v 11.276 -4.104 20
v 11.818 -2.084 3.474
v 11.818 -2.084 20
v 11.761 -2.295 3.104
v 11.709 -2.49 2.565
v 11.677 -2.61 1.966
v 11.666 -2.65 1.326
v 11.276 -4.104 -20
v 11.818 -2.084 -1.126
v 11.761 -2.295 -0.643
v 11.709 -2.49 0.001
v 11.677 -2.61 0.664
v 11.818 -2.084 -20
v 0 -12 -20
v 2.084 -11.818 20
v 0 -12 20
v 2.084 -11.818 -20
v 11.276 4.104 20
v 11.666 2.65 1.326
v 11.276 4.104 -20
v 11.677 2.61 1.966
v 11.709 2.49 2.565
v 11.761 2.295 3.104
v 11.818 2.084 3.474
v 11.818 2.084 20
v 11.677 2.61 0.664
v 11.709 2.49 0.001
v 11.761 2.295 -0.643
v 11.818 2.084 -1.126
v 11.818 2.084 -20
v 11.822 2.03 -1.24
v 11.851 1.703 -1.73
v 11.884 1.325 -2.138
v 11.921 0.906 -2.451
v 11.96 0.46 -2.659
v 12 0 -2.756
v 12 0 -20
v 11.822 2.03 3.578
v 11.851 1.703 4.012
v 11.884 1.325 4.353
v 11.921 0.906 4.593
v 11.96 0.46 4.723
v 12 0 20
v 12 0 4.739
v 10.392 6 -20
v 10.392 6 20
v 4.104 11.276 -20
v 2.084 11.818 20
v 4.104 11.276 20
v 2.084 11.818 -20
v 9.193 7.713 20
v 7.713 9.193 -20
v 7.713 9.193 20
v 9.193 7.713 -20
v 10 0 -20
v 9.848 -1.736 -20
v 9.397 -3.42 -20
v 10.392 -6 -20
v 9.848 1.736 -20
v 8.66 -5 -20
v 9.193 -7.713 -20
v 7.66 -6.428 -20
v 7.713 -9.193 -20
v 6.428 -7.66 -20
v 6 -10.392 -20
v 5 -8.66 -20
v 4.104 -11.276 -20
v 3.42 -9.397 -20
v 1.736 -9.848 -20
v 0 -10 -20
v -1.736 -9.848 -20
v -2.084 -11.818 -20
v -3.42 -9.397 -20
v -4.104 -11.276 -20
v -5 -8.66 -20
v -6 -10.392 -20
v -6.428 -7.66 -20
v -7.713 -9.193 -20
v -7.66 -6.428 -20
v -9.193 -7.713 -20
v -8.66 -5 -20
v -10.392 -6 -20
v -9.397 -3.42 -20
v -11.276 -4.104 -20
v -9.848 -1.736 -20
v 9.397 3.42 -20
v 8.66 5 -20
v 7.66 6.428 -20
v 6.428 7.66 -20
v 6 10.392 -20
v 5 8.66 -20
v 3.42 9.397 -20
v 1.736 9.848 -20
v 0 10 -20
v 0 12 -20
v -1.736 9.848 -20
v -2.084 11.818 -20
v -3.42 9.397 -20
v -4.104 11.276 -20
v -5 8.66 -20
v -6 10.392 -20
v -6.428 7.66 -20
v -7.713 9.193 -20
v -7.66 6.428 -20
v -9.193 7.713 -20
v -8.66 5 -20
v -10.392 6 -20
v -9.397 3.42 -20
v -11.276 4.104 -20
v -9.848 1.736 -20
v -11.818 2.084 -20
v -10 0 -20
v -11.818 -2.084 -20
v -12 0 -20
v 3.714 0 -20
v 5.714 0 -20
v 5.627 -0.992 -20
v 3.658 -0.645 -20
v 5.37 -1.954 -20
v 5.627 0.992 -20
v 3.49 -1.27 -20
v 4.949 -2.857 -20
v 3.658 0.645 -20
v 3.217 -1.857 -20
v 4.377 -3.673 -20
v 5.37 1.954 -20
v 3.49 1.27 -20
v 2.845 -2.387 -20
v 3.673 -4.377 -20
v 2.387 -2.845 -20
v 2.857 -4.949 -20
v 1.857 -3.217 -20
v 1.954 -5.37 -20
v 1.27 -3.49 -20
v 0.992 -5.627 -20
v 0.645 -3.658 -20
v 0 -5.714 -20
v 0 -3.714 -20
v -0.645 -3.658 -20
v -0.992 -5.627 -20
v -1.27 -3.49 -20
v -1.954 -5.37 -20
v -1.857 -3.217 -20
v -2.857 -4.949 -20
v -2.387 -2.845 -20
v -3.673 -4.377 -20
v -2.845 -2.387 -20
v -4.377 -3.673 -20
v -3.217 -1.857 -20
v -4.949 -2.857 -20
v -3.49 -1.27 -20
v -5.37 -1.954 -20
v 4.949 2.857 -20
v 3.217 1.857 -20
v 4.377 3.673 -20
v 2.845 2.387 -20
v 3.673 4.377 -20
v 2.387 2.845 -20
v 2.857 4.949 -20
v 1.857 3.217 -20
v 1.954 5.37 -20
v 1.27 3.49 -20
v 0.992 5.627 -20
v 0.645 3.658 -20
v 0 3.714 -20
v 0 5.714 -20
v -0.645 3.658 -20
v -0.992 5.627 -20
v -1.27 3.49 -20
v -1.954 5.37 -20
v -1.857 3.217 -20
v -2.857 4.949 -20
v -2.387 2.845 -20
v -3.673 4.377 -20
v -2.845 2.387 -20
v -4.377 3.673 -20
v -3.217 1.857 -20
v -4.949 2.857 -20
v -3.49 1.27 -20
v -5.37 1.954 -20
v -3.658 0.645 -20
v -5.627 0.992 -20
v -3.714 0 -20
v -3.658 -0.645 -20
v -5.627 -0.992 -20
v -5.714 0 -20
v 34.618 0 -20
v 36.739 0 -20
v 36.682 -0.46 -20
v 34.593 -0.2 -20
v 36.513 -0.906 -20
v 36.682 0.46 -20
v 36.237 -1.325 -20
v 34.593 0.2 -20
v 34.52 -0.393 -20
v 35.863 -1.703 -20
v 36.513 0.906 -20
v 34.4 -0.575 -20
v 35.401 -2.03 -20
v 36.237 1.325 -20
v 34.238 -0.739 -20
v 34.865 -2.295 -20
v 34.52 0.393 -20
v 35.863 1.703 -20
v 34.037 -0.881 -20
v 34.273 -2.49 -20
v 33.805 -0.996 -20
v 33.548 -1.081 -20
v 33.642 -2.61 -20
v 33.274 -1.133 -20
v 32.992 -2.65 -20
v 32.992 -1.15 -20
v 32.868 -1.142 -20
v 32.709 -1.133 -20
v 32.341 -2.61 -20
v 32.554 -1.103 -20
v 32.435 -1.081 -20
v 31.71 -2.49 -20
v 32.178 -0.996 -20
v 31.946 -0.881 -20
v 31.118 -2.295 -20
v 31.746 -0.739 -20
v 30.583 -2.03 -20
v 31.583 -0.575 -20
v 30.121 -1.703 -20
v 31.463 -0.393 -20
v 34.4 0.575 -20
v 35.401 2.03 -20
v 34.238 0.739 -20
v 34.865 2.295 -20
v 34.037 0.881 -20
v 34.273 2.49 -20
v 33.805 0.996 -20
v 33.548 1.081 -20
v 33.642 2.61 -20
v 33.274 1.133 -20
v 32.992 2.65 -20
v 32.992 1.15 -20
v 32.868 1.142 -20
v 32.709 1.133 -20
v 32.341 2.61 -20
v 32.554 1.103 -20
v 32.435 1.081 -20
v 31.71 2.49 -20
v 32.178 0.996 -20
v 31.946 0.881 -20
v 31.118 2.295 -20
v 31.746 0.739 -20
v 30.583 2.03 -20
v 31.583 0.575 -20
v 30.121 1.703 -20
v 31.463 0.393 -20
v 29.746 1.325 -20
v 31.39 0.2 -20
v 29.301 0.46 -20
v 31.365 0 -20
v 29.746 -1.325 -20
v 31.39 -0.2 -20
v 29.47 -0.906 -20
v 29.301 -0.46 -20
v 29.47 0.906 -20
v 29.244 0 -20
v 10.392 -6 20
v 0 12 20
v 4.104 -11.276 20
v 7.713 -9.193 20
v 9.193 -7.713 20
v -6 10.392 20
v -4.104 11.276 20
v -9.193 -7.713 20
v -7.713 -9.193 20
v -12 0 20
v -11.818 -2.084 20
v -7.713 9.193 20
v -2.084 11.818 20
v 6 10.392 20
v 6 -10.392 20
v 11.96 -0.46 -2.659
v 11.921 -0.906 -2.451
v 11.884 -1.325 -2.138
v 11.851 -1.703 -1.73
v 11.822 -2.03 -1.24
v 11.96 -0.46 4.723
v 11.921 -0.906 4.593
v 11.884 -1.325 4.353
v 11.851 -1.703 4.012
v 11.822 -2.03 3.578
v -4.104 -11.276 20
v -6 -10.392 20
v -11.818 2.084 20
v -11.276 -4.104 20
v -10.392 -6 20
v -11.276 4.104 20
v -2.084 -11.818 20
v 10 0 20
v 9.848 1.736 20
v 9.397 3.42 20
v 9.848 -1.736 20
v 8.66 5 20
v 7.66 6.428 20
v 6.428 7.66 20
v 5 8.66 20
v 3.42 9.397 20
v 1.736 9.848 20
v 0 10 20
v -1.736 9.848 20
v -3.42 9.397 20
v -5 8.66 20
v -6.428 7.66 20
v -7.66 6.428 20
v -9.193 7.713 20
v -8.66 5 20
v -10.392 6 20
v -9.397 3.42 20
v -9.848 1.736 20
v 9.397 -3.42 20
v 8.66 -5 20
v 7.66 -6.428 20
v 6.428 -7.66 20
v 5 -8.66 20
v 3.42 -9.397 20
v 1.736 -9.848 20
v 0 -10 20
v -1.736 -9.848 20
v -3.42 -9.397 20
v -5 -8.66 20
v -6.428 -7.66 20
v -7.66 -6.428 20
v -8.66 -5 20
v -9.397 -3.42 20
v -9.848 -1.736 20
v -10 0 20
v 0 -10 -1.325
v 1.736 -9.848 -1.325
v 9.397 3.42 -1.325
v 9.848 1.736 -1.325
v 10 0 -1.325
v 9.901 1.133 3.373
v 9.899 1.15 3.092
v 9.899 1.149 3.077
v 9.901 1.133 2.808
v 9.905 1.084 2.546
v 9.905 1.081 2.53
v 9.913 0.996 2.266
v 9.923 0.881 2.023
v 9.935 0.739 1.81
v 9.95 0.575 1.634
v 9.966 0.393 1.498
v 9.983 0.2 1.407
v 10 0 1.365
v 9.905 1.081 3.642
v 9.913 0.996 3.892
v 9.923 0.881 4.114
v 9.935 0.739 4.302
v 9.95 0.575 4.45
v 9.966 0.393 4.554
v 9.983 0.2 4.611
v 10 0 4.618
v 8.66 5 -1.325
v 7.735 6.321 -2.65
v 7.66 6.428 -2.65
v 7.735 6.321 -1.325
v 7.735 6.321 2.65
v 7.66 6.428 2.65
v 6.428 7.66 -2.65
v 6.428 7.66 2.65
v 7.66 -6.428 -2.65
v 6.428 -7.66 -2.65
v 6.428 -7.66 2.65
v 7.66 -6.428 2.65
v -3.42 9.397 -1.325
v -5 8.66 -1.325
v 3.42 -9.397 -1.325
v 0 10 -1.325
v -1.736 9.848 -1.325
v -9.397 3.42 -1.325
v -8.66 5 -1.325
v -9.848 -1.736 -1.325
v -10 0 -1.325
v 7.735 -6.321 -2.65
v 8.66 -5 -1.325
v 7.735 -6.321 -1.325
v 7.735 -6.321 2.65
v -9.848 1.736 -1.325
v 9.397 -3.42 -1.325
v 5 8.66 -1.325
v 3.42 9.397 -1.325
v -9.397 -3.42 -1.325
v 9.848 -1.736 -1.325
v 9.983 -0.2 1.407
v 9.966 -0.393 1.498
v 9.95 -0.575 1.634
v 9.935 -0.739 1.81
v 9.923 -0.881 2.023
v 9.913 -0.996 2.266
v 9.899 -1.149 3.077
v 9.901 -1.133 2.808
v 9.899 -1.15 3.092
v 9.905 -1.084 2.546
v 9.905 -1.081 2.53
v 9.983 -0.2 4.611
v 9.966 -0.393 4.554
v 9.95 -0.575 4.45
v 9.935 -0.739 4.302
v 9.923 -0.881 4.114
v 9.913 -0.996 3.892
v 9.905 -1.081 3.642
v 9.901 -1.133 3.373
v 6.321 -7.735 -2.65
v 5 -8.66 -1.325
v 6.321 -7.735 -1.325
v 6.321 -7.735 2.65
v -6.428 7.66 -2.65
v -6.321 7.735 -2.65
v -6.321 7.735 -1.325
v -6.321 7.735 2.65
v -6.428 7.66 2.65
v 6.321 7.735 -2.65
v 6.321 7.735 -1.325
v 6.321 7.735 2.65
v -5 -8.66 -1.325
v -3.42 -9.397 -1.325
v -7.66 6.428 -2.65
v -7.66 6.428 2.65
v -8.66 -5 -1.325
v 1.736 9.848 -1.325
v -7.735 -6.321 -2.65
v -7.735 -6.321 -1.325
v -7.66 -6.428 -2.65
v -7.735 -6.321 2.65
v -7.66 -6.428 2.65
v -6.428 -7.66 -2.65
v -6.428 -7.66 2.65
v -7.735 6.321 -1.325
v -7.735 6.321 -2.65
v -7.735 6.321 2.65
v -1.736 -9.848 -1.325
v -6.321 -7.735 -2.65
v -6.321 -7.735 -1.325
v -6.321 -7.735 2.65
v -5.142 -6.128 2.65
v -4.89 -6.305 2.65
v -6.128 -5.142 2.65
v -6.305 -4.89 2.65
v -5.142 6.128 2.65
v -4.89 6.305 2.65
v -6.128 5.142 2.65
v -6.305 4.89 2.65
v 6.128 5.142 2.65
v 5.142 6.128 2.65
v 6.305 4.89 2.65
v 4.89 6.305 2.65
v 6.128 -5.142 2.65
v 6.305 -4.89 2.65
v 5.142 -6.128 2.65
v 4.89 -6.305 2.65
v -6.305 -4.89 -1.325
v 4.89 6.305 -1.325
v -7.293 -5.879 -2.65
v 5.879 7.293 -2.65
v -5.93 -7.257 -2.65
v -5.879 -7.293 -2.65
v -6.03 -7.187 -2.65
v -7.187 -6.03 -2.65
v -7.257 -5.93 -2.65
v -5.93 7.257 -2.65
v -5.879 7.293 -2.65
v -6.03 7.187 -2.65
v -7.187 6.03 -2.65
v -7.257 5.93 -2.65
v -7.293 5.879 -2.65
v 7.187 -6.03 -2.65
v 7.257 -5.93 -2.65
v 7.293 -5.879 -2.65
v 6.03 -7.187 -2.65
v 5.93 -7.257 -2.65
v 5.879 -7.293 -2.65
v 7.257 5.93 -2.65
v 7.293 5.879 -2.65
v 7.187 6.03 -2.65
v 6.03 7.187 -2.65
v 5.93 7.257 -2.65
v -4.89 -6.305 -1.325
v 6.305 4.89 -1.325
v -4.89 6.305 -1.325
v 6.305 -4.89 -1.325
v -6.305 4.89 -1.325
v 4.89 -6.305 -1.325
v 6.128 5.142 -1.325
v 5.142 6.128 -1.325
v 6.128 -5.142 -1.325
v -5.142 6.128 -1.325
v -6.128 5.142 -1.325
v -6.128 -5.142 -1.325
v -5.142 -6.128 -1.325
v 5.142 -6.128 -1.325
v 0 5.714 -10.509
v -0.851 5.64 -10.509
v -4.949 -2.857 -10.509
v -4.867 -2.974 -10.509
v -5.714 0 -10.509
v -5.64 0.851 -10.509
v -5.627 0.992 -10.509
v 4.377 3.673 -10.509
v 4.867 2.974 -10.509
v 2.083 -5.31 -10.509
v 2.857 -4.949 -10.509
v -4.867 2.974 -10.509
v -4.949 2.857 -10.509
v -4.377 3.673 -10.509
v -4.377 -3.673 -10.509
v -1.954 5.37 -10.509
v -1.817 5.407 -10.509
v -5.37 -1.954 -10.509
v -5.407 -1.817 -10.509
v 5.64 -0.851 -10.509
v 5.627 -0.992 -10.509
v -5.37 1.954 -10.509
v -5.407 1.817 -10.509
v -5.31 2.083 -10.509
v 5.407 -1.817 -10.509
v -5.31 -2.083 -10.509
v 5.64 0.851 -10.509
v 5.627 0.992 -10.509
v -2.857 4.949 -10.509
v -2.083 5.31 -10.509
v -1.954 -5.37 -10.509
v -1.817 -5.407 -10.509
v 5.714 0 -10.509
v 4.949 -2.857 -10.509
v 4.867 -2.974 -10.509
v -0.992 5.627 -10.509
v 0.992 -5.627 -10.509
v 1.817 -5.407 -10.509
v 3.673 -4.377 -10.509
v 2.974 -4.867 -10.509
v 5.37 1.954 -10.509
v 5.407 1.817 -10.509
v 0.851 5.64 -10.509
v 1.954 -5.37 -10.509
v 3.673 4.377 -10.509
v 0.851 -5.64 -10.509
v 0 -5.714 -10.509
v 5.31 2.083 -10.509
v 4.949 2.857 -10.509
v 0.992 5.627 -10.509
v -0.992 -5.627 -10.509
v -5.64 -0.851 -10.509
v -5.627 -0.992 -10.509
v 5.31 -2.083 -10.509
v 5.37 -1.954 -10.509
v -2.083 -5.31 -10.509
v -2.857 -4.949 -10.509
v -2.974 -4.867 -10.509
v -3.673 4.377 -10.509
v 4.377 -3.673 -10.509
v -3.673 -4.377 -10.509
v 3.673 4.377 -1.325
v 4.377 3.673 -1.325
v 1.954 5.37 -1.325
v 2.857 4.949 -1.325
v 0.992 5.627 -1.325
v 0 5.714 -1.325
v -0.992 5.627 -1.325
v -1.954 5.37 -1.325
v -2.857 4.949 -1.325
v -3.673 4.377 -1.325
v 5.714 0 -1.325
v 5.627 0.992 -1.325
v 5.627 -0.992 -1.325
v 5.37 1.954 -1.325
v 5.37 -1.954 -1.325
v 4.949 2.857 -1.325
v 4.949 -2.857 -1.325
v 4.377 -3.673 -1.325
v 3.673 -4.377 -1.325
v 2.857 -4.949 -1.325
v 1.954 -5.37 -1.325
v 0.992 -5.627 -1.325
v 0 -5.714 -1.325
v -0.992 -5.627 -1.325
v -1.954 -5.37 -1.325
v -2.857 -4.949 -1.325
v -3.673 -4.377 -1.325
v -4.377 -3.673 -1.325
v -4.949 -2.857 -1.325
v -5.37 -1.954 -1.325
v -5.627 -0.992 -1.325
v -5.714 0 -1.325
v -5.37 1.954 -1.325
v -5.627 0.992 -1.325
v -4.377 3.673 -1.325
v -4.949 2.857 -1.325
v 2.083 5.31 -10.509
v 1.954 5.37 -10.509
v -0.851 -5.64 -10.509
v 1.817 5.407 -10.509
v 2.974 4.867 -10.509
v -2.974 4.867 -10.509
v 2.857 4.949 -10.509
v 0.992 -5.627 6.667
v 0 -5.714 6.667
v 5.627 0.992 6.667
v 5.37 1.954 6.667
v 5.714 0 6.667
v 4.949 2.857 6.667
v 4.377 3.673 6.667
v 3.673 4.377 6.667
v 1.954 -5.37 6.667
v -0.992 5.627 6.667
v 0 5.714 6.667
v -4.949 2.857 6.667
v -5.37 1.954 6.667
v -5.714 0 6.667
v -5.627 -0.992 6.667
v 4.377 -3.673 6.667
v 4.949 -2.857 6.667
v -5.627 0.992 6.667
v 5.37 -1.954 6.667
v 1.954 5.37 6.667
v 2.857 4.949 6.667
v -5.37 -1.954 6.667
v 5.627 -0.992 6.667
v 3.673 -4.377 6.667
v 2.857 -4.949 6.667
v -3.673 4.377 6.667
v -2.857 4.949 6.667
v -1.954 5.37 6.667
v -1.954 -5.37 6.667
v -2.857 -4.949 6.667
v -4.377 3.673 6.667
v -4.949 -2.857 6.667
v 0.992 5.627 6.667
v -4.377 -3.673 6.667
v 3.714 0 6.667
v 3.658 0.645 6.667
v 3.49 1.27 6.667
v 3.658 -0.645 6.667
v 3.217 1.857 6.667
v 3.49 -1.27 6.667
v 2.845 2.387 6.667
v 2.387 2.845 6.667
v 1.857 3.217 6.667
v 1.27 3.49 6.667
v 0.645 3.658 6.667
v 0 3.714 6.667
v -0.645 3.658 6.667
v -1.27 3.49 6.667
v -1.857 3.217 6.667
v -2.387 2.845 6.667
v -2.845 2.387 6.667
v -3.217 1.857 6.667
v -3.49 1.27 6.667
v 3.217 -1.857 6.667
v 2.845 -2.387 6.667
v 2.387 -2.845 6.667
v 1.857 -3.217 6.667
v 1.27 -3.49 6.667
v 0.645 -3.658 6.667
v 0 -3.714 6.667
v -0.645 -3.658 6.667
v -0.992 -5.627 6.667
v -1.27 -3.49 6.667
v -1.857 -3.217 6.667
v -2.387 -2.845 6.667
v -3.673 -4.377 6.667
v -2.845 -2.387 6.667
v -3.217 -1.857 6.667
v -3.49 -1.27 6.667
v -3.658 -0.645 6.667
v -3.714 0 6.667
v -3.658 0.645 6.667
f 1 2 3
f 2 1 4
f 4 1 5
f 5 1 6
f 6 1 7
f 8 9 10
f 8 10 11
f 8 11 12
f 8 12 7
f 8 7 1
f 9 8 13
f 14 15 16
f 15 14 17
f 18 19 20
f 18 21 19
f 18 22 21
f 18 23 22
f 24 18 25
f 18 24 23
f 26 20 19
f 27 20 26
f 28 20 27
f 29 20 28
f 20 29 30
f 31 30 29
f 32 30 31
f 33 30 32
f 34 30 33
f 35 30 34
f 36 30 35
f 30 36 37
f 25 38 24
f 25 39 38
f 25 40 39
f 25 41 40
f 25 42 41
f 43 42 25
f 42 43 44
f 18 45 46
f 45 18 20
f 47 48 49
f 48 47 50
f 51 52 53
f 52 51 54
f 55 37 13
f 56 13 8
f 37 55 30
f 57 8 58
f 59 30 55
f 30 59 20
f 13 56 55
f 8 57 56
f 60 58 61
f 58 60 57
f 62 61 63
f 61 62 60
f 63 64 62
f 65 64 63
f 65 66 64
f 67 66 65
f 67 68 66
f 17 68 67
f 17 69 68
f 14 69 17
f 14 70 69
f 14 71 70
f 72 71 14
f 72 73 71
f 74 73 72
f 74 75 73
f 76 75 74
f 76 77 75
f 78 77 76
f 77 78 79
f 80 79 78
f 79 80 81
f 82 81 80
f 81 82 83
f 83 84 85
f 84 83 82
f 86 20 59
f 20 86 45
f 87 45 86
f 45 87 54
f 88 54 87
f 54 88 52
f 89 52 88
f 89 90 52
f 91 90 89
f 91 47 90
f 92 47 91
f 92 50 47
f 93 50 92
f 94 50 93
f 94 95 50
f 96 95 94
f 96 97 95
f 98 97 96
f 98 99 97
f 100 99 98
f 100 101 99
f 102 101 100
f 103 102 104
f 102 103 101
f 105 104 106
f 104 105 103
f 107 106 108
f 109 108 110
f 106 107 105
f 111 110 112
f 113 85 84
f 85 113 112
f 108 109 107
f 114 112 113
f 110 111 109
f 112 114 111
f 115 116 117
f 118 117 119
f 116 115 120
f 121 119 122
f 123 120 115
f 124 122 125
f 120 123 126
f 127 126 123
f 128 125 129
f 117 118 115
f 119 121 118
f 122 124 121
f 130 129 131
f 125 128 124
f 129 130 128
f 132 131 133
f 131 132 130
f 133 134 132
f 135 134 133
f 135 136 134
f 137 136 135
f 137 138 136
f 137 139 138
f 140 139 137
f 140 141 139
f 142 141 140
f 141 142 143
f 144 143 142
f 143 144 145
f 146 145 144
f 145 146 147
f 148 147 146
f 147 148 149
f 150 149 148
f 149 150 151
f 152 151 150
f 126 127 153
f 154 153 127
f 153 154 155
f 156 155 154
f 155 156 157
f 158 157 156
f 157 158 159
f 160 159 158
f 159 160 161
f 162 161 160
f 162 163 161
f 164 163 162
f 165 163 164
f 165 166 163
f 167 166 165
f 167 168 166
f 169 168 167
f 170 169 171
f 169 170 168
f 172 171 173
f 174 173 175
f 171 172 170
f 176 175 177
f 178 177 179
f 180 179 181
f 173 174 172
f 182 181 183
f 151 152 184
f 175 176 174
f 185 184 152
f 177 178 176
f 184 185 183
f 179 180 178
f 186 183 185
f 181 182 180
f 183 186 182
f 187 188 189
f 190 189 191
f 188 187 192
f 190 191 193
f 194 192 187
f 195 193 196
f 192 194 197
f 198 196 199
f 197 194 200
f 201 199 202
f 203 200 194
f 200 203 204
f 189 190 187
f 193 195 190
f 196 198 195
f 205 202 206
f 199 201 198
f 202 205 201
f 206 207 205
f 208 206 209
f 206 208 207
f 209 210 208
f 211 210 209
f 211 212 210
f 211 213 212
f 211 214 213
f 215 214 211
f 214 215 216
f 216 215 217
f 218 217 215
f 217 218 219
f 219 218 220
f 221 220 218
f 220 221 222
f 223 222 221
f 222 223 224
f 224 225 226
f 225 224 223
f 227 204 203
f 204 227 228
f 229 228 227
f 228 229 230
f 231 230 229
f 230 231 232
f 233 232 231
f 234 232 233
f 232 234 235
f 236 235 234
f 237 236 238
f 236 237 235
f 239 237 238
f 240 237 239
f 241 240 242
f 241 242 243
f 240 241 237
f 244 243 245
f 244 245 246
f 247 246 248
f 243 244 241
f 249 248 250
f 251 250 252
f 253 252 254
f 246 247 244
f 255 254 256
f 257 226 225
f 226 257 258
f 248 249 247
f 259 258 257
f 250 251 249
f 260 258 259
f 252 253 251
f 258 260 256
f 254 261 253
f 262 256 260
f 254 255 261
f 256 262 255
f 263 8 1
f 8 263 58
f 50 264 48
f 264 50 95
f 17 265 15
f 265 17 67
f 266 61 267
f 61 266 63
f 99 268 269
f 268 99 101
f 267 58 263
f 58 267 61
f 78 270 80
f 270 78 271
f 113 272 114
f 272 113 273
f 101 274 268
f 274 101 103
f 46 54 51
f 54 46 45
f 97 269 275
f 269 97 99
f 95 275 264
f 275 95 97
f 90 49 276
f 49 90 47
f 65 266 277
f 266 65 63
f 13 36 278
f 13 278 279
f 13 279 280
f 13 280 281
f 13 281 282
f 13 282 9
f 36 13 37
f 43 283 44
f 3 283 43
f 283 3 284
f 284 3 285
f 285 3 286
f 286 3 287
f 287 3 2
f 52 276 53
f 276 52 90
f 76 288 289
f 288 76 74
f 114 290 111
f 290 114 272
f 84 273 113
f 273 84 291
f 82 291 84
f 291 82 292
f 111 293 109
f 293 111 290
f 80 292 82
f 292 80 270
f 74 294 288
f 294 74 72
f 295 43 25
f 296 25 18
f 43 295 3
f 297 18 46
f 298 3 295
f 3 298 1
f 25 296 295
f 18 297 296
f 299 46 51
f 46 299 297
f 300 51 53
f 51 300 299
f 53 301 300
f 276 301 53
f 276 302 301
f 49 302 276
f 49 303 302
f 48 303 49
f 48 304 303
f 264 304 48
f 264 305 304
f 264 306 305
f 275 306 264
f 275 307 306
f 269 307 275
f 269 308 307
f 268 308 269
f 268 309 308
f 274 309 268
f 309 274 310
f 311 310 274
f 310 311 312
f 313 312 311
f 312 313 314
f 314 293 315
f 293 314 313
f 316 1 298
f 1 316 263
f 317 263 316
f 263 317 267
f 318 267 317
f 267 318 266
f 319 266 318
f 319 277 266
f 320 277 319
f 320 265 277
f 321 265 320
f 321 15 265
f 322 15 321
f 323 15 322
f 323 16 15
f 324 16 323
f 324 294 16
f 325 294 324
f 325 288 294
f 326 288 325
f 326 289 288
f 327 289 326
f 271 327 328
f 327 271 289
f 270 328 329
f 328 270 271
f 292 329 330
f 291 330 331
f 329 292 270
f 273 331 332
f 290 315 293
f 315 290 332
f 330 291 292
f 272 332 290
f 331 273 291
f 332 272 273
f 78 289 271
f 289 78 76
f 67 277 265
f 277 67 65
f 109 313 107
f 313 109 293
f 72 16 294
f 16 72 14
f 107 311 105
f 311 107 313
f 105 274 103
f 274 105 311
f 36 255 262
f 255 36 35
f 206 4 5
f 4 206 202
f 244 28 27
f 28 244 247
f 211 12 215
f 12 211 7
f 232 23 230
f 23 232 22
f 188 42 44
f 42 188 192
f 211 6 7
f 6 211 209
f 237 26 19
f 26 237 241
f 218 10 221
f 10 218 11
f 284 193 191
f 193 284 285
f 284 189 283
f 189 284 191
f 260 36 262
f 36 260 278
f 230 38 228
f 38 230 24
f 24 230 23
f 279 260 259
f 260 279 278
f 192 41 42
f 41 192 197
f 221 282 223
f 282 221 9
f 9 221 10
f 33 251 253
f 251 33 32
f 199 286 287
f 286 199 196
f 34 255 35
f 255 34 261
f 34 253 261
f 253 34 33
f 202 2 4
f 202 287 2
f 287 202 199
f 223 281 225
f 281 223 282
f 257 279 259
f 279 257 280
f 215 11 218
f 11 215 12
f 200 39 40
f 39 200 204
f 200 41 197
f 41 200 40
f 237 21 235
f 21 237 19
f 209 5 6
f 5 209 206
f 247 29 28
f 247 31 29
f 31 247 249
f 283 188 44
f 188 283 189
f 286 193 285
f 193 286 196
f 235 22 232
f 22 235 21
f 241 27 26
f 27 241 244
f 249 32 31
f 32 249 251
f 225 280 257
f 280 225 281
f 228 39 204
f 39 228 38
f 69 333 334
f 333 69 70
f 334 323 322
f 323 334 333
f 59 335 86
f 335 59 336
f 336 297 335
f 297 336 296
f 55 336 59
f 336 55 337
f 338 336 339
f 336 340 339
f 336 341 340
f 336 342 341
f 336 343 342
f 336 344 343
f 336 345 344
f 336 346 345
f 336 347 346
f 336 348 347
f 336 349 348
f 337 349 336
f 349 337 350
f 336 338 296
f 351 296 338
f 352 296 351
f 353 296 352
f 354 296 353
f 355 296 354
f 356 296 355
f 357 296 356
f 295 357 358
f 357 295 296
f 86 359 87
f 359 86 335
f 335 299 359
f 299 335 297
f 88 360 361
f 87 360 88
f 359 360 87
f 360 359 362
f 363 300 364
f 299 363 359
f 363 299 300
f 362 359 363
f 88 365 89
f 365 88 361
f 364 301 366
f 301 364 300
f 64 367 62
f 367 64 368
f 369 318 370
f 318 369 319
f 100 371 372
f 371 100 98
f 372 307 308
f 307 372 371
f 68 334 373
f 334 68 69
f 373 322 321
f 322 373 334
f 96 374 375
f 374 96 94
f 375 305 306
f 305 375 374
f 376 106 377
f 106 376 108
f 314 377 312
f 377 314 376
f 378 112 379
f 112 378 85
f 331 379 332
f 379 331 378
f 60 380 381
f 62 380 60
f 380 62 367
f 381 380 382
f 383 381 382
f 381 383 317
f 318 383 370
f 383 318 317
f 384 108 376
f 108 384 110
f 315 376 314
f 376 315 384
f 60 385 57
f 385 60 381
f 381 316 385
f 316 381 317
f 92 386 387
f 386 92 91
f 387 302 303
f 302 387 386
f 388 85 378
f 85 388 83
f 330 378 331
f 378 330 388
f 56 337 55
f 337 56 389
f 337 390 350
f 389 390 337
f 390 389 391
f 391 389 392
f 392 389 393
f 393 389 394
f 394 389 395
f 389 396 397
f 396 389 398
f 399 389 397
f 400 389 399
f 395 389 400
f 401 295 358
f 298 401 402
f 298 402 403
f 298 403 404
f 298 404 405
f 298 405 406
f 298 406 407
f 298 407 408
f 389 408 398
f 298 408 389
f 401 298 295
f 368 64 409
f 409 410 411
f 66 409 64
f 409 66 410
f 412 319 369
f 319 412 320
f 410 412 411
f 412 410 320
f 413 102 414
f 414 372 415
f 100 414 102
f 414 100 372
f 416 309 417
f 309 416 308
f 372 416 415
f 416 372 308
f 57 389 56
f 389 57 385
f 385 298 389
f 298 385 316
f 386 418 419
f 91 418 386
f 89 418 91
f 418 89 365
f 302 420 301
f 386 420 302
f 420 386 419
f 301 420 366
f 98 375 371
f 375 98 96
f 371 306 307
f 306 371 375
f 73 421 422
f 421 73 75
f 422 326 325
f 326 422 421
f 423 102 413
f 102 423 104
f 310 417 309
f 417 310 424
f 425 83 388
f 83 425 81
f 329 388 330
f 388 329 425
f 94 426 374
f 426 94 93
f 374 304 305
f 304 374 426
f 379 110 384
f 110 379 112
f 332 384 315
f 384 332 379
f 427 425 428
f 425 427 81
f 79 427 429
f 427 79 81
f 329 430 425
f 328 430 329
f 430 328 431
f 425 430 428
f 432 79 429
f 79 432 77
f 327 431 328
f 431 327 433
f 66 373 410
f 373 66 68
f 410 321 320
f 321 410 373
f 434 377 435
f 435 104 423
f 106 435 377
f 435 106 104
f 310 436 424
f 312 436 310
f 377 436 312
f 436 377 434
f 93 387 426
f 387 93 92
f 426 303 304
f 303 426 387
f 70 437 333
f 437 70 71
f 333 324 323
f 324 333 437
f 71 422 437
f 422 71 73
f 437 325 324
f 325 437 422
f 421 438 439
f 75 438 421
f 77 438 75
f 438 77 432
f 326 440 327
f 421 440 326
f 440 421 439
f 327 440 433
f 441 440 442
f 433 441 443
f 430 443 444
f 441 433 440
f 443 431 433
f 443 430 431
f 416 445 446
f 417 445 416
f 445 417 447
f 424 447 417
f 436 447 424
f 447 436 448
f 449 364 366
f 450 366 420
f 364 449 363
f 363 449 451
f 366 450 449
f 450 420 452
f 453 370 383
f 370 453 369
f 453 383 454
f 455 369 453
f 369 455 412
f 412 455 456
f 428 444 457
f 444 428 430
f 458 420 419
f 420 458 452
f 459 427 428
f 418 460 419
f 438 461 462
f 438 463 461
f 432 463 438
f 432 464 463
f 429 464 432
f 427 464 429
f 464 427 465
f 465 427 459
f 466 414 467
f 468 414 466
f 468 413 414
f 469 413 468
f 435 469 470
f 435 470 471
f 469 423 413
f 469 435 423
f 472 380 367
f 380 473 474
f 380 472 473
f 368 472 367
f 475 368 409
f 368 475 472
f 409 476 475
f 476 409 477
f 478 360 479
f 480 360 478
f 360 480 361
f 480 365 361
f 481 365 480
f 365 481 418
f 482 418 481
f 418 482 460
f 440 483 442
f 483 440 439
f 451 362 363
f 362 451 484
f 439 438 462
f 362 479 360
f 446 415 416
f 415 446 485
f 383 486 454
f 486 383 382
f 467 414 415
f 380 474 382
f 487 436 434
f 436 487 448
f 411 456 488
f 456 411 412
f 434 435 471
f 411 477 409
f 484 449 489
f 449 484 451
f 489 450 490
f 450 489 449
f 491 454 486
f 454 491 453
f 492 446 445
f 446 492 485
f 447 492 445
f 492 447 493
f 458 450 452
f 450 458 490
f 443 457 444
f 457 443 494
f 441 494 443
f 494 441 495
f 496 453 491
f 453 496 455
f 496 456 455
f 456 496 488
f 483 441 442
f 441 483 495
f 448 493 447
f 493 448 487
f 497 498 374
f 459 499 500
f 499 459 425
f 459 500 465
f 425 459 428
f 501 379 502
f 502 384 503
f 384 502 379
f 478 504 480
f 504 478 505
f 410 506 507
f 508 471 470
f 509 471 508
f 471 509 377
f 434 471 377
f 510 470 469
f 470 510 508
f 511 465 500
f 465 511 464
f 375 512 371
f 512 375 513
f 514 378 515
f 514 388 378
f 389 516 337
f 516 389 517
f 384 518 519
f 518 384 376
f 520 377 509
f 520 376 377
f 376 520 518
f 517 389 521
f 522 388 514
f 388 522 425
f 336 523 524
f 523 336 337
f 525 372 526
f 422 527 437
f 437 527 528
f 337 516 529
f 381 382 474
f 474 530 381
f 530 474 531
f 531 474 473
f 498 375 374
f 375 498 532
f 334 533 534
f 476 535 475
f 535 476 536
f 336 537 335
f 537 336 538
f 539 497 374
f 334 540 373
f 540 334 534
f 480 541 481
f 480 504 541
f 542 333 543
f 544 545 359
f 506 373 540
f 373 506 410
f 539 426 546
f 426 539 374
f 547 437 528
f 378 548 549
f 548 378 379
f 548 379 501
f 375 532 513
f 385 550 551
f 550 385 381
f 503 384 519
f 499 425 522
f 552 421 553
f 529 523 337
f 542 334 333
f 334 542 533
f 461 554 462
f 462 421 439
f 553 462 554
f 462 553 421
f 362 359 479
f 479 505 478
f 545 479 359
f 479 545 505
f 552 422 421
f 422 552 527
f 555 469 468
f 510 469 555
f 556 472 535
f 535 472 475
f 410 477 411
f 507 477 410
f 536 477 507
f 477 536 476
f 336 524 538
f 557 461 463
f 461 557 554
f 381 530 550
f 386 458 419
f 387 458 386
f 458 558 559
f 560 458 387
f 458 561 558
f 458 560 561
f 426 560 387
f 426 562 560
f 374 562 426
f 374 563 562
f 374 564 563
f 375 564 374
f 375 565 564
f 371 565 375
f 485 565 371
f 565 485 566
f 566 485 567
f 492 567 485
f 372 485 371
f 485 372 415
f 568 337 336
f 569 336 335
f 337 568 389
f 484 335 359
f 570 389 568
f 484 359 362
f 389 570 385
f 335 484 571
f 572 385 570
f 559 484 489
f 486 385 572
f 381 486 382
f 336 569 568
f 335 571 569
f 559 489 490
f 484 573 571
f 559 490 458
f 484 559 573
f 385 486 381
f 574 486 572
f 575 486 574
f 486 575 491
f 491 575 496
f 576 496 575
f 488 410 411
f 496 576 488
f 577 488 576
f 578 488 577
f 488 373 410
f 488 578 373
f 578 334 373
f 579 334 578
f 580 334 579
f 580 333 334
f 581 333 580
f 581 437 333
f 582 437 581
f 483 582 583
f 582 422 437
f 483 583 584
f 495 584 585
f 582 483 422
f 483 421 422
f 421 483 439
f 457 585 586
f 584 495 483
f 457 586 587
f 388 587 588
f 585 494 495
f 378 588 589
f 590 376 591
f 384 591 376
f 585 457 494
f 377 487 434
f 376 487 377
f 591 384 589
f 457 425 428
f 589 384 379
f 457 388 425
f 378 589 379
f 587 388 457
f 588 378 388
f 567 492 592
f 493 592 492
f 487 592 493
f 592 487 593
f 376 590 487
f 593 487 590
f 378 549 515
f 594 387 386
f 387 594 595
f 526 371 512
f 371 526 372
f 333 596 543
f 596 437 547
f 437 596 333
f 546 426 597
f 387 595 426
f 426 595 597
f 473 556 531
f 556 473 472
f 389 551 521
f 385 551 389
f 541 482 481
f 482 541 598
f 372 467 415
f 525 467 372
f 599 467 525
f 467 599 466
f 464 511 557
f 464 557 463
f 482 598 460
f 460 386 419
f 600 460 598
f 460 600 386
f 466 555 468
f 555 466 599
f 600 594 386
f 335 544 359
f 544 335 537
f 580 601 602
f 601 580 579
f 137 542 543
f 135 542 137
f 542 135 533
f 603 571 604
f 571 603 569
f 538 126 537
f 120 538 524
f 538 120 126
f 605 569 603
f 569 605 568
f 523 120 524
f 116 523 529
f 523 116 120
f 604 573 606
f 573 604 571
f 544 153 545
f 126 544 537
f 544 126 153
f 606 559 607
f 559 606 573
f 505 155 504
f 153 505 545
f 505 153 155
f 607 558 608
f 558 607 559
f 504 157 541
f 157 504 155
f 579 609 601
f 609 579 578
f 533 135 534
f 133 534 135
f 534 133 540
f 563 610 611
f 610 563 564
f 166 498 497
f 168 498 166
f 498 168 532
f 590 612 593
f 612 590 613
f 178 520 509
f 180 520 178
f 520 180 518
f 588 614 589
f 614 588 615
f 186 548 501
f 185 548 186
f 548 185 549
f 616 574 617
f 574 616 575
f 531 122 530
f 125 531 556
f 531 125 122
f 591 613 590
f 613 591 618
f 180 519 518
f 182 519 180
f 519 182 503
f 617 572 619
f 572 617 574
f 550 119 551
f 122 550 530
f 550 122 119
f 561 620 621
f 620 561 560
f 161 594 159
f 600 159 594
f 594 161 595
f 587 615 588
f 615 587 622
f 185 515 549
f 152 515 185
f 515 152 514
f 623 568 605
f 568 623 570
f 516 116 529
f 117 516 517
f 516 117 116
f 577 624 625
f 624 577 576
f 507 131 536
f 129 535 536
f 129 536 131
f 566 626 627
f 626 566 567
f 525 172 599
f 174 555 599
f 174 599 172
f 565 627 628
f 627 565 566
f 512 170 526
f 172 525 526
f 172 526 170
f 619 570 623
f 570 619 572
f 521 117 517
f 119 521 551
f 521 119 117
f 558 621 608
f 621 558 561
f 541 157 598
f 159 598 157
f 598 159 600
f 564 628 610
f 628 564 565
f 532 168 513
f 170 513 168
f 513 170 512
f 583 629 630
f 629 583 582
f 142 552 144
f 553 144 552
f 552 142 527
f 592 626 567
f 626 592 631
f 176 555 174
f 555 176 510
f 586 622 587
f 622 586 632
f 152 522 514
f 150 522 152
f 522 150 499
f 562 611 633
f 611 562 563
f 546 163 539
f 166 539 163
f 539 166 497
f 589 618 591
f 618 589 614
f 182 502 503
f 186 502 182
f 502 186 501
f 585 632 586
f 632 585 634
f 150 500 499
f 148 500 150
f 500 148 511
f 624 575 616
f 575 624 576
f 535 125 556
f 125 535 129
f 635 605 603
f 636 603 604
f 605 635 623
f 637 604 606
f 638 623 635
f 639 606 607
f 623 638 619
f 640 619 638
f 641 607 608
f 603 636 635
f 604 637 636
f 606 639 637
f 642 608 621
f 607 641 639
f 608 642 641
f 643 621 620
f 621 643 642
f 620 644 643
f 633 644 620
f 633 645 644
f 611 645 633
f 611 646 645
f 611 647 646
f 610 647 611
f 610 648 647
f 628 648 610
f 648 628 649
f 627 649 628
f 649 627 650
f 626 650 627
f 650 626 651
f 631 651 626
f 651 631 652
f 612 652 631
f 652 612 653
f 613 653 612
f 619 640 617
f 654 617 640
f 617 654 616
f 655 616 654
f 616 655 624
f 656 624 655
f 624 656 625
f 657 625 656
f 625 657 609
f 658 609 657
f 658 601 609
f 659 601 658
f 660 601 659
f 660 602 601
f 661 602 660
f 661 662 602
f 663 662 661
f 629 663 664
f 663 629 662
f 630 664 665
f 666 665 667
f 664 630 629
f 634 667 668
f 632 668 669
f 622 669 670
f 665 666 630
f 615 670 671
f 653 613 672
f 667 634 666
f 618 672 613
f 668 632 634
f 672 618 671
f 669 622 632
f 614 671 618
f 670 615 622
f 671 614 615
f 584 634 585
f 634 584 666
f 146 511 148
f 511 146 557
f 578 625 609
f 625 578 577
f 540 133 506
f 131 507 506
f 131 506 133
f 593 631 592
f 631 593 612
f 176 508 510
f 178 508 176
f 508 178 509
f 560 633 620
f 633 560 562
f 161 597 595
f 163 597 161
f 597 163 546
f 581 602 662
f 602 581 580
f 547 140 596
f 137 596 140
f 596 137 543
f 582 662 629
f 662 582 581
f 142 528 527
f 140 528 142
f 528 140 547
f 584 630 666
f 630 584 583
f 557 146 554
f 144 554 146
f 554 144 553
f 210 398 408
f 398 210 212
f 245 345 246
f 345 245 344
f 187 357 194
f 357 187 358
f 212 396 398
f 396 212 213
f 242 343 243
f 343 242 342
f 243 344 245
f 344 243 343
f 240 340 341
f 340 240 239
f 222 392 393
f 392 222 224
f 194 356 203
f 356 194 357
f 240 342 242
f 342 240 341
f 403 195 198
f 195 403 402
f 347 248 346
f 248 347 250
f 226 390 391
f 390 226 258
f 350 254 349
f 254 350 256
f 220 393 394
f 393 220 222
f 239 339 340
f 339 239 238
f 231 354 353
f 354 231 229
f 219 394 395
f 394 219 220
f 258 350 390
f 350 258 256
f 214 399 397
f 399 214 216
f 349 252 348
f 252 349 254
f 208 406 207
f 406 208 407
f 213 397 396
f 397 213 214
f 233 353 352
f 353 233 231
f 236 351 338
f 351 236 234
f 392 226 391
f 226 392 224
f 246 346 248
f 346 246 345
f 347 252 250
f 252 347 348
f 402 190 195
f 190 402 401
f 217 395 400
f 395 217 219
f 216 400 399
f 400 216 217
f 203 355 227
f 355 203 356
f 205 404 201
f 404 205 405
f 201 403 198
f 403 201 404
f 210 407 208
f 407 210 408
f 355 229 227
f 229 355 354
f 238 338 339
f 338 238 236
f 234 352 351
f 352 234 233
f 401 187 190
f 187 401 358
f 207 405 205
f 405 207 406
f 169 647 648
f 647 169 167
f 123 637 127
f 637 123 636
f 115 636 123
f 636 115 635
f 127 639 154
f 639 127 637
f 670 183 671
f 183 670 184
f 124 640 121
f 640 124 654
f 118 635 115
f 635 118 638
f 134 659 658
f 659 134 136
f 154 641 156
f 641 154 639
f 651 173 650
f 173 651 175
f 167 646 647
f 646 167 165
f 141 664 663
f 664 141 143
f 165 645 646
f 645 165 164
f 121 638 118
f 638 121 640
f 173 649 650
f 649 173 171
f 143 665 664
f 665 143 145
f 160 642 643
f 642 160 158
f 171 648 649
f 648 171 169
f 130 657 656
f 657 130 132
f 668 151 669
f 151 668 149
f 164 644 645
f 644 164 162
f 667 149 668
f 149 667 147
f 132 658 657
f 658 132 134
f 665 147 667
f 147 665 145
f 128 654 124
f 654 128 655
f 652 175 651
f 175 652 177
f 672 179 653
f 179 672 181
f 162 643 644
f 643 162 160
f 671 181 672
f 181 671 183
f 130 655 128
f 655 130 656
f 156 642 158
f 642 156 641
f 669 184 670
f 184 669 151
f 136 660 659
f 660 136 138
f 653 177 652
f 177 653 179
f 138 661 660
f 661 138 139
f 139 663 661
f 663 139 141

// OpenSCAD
Tube_radius=10;
Tube_inner_radius=8;
Joint_length=40;
Hose_inner_radius=2.65;

$fn=36;

difference()
    {
    union()
        {
        difference()
            {
                union()
                    {
        //Corpo
                    cylinder(r=Tube_radius+2,h=Joint_length,center=true);
        //Tubo uscita acqua
                    translate([Tube_radius/1.5,0,-Hose_inner_radius/2+5+Hose_inner_radius])
                    rotate([0,135,0])
                    cylinder(r=Hose_inner_radius,h=Joint_length*2);
                    }

        //Foro centrale corpo
                cylinder(r=Tube_radius,h=Joint_length*2,center=true);


            }
//Paratia centrale conica
        translate([0,0,-Hose_inner_radius/2])
        rotate([0,180,0])
        cylinder(r2=Tube_inner_radius/1.5,r1=Tube_radius,h=10);
//Rialzo centrale raccolta acqua
        translate([0,0,-Joint_length/3])
        rotate([0,0,0])
        cylinder(r=Tube_inner_radius/1.4,h=Joint_length,center=true);

//Rialzini per non bloccare foro uscita acqua        
    difference()
        {
         union()
            {
            rotate([0,0,45])
            cube([Tube_radius*2,2,Hose_inner_radius*2],center=true);
             rotate([0,0,-45])
            cube([Tube_radius*2,2,Hose_inner_radius*2],center=true);
            }
        cylinder(r=Tube_inner_radius,h=Joint_length,center=true);
        }

        }


        //Foro tubo uscita acqua
                translate([Tube_radius/1.5,0,-Hose_inner_radius/2+5+Hose_inner_radius])
                rotate([0,135,0])
                cylinder(r=Hose_inner_radius-1.5,h=Joint_length*2+5);

        translate([0,0,0])
        rotate([0,0,0])
        cylinder(r=Tube_inner_radius/1.4-2,h=Joint_length*2,center=true);

        //Rimozione eccessi sopra e sotto
                translate([0,0,50+Joint_length/2])
                cube([Tube_radius*25,Tube_radius*25,100],center=true);
                translate([0,0,-50-Joint_length/2])
                cube([Tube_radius*25,Tube_radius*25,100],center=true);
    }
